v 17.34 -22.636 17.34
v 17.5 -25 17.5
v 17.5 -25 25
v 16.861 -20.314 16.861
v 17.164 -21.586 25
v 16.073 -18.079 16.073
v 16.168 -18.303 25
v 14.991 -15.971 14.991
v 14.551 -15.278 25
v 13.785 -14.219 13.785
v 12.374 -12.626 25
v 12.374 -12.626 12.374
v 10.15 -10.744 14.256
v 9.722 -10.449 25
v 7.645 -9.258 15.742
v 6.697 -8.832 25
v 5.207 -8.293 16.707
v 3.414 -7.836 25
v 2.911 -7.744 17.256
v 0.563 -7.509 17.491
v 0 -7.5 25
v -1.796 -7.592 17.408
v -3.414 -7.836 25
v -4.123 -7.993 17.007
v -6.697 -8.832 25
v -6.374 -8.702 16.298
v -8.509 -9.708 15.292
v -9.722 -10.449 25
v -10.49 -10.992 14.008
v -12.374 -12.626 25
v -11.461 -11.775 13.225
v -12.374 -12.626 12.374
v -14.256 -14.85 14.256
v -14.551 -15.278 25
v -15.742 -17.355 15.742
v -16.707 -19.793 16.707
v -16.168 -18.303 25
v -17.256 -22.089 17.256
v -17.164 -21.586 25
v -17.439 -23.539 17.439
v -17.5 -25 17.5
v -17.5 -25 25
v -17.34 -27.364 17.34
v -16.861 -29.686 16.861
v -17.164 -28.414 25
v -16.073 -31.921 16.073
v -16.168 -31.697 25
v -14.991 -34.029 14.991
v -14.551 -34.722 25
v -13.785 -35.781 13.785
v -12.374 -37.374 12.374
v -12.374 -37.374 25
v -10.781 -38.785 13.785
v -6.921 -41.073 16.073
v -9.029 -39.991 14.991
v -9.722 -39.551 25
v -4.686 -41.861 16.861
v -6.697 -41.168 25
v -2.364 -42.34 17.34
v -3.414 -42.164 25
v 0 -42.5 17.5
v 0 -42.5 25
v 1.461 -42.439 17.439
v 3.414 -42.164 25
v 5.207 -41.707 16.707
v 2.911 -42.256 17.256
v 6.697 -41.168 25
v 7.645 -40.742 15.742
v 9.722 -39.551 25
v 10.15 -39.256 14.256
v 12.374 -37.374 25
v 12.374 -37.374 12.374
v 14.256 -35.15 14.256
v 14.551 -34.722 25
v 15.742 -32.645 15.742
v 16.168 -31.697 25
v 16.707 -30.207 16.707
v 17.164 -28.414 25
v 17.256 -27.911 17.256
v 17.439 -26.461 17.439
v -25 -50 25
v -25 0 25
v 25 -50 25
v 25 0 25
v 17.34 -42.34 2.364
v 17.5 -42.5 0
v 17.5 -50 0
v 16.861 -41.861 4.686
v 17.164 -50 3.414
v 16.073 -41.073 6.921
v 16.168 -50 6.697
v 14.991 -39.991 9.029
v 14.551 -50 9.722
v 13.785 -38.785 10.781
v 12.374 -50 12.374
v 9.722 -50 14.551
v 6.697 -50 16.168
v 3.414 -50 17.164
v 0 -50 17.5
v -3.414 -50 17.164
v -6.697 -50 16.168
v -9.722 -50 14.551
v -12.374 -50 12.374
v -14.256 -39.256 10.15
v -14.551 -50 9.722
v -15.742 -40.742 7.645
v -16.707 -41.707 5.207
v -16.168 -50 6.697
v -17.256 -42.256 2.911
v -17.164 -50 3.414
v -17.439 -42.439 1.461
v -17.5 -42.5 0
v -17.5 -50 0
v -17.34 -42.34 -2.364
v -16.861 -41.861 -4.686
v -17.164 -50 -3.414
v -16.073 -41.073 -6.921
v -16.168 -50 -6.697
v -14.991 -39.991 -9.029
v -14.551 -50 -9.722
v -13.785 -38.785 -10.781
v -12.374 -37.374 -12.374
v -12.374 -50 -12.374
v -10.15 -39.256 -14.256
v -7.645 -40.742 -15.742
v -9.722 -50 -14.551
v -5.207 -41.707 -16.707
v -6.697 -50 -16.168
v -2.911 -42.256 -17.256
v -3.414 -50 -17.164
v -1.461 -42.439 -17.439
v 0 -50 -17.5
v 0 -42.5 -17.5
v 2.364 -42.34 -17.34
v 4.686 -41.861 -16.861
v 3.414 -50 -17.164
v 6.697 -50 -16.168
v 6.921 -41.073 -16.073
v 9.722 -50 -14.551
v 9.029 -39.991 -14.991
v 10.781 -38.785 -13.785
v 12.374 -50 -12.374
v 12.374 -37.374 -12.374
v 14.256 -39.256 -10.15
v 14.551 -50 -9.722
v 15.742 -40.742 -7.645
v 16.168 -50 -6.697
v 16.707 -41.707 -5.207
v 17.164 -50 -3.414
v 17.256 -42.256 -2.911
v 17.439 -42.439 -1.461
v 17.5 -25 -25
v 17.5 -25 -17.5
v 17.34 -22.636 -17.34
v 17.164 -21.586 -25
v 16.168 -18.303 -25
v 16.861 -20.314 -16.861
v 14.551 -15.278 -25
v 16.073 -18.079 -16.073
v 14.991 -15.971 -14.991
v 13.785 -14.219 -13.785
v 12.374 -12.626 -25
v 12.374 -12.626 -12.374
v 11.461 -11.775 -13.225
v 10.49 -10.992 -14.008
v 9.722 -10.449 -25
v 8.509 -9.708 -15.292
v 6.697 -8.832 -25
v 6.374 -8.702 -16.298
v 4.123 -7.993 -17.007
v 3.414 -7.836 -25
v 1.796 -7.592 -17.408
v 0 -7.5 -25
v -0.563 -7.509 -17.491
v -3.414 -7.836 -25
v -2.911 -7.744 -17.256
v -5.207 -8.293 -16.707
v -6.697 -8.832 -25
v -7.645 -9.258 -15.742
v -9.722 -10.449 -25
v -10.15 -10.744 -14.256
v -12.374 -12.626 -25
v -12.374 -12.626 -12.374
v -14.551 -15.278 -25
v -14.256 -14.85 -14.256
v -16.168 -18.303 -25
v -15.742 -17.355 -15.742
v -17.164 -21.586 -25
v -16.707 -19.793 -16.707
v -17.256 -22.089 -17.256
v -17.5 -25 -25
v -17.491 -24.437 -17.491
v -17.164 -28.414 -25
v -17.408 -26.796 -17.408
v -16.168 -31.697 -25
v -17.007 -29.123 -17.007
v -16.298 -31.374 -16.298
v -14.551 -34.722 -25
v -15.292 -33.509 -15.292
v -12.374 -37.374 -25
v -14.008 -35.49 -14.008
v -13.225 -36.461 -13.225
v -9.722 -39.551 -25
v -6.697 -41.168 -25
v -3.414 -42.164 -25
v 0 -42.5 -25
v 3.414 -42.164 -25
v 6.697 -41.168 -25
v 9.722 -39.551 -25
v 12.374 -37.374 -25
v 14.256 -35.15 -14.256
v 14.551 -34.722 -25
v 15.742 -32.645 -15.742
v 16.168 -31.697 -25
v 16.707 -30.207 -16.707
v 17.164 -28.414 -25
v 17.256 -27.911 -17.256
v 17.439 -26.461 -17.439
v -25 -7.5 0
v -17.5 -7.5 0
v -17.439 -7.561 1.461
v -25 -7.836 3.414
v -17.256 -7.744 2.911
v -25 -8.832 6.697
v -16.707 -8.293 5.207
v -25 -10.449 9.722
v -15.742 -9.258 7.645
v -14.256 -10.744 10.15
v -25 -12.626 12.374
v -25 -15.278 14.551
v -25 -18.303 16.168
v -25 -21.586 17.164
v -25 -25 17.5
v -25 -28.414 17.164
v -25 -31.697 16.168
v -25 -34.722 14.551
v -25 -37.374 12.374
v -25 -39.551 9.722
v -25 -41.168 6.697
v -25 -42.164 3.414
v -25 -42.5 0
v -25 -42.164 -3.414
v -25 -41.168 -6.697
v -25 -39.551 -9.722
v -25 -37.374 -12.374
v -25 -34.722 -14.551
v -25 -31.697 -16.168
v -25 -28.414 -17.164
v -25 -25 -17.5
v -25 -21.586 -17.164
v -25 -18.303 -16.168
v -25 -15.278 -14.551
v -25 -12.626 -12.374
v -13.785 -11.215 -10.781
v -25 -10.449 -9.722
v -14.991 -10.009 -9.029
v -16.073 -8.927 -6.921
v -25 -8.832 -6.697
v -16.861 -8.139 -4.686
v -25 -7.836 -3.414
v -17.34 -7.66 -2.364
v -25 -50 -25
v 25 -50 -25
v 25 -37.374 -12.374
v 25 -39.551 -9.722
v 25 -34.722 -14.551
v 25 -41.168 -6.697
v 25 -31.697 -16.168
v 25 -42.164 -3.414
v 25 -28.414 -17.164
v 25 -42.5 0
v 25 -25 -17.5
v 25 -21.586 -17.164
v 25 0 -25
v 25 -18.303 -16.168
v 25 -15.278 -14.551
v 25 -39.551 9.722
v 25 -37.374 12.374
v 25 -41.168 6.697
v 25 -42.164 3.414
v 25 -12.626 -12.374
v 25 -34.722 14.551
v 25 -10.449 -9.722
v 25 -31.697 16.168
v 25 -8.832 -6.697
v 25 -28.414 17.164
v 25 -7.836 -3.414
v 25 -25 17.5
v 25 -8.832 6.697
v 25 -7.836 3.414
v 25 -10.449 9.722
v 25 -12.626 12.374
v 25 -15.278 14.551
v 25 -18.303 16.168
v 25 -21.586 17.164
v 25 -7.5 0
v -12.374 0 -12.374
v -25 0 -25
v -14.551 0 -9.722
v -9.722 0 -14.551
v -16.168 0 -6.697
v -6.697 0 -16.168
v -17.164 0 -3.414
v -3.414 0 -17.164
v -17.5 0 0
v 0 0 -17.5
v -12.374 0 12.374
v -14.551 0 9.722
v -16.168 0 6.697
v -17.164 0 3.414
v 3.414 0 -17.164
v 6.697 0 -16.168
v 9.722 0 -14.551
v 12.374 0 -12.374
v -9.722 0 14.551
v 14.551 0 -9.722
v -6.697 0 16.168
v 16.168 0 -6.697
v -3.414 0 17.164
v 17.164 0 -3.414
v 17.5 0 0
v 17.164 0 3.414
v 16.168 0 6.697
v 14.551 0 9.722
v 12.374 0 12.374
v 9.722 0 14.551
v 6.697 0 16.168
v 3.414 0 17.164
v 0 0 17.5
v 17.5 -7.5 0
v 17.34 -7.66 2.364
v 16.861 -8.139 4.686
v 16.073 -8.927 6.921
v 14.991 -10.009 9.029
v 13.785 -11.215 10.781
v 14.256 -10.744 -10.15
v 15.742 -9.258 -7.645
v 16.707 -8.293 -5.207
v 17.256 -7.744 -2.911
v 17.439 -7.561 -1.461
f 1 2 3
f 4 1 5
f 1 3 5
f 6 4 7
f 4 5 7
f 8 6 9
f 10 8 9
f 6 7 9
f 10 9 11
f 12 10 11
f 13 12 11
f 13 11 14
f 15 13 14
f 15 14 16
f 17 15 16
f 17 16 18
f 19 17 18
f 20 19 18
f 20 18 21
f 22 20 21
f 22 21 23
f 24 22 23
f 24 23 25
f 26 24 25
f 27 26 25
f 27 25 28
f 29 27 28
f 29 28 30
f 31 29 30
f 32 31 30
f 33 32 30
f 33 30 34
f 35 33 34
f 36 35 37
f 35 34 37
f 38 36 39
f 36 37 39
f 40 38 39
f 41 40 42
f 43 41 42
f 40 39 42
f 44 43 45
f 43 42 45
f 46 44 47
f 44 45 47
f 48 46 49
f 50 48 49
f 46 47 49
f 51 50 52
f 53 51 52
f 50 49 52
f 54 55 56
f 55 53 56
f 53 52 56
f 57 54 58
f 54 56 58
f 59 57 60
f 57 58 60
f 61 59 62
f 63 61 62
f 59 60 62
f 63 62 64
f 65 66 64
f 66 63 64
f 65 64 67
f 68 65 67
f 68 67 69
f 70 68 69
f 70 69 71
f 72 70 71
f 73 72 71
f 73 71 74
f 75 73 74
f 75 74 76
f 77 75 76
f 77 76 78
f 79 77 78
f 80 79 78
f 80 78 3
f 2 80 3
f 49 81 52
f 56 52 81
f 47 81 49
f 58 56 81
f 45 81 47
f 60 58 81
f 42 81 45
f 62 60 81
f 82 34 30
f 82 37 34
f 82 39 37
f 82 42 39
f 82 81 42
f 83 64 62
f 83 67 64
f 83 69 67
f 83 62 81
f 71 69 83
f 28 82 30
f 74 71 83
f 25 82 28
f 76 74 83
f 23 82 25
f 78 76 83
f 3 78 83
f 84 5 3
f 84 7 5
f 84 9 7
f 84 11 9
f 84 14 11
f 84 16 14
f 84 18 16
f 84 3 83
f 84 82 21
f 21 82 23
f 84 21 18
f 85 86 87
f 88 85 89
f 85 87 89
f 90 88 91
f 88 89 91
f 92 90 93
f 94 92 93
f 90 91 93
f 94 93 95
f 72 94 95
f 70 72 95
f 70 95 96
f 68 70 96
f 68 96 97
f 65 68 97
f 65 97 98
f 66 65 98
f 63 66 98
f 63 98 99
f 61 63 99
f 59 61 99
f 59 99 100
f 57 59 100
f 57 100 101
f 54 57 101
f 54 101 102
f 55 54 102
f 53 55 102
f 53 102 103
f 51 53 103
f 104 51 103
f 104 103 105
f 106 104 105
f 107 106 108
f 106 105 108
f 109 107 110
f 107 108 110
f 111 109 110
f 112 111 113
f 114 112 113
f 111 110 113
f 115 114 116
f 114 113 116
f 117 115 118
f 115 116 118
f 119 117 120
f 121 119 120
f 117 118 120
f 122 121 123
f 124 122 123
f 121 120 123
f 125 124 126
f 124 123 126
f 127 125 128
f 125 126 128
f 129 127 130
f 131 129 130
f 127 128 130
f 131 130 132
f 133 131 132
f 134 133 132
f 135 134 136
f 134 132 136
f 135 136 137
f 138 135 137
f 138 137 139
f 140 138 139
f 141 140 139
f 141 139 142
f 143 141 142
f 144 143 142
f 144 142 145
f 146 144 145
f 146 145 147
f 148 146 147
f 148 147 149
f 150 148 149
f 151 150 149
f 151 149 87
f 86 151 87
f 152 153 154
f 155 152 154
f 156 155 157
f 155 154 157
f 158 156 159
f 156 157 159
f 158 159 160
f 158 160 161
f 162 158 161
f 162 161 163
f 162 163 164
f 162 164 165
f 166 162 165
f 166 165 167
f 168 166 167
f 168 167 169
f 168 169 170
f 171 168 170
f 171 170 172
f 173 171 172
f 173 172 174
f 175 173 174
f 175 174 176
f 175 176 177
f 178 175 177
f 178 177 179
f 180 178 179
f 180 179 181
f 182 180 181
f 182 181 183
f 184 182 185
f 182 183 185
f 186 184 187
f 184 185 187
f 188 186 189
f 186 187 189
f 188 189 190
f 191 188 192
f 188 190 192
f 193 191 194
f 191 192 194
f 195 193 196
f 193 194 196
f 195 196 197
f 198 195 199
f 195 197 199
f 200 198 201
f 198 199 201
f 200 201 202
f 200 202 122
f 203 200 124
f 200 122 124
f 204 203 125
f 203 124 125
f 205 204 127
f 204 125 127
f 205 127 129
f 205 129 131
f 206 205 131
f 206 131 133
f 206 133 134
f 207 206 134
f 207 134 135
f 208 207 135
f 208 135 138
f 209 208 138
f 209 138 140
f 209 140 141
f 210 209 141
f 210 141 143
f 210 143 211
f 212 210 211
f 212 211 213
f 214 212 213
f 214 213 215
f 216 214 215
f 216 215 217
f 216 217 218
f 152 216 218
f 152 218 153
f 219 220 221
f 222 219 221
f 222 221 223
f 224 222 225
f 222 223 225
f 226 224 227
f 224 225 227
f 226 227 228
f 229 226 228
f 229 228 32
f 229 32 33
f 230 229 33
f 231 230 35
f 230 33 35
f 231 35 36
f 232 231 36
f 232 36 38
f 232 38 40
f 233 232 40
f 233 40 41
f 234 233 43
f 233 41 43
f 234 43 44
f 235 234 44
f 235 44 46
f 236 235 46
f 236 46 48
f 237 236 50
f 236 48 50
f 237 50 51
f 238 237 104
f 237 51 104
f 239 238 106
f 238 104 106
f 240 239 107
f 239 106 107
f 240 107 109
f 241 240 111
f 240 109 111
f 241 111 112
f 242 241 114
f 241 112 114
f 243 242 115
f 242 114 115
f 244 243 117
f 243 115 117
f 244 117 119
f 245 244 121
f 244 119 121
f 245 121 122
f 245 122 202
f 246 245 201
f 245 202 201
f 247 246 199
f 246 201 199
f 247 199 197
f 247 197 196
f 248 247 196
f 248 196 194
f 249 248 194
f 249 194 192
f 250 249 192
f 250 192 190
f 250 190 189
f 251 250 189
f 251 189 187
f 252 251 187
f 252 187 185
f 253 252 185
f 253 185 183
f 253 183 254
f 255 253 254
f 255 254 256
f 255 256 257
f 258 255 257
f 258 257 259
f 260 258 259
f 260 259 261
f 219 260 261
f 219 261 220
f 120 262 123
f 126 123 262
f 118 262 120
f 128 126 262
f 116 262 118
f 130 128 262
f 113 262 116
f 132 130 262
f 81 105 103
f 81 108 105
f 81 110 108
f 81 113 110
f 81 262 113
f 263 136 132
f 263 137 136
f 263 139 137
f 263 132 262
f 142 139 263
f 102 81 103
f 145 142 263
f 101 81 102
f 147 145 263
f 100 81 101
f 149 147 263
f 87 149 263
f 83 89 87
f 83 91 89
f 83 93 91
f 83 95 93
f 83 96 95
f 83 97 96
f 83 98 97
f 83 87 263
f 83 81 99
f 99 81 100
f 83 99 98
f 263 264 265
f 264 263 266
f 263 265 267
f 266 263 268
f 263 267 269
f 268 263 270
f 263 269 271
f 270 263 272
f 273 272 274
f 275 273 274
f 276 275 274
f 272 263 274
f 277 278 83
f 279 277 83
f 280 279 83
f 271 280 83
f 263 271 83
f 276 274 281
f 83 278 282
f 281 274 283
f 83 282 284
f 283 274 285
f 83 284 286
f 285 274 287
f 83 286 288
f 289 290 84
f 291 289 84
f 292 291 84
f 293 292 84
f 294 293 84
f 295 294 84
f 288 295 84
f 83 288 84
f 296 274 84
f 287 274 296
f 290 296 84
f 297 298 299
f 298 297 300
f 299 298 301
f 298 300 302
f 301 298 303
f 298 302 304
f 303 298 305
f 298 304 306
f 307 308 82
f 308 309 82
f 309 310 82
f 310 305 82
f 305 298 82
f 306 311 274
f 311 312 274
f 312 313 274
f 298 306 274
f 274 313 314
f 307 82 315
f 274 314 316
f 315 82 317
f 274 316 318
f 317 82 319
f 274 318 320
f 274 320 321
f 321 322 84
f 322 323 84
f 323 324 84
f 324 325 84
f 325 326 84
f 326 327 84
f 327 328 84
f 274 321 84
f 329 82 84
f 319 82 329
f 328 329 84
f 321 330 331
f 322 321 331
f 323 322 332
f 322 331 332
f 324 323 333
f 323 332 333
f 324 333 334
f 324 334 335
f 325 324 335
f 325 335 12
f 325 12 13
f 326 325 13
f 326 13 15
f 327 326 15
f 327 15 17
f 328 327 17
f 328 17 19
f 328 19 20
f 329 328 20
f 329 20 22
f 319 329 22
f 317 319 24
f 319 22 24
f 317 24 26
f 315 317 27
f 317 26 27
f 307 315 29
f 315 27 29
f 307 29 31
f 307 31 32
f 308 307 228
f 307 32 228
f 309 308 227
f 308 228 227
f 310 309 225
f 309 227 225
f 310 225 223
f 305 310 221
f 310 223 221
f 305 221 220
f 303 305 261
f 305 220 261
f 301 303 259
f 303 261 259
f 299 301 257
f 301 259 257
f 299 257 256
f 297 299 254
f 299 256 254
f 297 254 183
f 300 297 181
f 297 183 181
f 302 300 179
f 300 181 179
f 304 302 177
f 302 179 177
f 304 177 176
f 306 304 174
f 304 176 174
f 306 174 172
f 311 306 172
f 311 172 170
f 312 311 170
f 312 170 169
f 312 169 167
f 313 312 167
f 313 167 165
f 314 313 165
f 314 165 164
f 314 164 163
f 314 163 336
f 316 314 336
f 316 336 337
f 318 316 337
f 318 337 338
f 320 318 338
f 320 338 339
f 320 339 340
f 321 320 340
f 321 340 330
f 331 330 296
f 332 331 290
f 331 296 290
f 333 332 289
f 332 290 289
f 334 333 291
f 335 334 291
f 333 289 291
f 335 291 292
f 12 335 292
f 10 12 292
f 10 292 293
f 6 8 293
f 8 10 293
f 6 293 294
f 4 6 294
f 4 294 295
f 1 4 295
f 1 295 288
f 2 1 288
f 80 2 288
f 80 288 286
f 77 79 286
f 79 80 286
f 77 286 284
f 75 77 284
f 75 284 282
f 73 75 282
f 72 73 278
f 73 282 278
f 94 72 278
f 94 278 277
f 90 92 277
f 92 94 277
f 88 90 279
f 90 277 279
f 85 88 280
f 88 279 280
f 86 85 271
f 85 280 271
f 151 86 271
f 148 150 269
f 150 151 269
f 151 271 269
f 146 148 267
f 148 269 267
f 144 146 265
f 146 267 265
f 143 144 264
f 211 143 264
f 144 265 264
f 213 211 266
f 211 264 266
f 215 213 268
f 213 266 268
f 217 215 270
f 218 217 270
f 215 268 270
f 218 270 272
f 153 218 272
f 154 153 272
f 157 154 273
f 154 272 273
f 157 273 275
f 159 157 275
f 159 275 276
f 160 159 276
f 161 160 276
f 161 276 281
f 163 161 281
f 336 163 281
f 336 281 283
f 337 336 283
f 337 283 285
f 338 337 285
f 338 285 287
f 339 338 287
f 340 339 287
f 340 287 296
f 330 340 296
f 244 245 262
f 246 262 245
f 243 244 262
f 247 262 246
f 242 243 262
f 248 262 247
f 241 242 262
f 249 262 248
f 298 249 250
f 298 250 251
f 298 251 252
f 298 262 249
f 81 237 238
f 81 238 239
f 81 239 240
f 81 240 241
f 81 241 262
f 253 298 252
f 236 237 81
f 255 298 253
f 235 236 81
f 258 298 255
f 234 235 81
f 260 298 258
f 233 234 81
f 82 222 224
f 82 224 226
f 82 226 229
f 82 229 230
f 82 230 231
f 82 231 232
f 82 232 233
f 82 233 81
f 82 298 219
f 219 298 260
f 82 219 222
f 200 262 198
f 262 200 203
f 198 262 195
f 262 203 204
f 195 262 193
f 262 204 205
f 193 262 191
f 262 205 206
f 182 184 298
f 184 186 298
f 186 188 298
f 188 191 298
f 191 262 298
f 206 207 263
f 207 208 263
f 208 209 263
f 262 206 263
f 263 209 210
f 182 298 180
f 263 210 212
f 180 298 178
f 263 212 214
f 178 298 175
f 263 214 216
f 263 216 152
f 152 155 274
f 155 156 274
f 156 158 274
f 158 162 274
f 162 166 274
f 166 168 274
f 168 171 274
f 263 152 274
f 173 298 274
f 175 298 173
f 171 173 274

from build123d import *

# Parameters (mm, degrees)
F0_W     = 50
F0_H     = 50
F1_DEPTH = 50
F2_R     = 17.5
F3_DEPTH = 50.001
F4_R     = 17.5
F5_DEPTH = 50.001
F6_R     = 17.5
F7_DEPTH = 50.001


with BuildPart() as f1:
    # F0 (on Front) → F1 (new body)
    with BuildSketch(Plane.XZ):
        Rectangle(F0_W, F0_H)
    extrude(amount=F1_DEPTH)

    # F2 (on face) → F3 (cut, through all)
    with BuildSketch(Plane.XZ.offset(50)):
        Circle(F2_R)
    extrude(amount=-F3_DEPTH, mode=Mode.SUBTRACT)

    # F4 (on face) → F5 (cut, through all)
    with BuildSketch(Plane.XY.offset(25)):
        with Locations((0, -25)):
            Circle(F4_R)
    extrude(amount=-F5_DEPTH, mode=Mode.SUBTRACT)

    # F6 (on face) → F7 (cut, through all)
    with BuildSketch(Plane.YZ.offset(25)):
        with Locations((-25, 0)):
            Circle(F6_R)
    extrude(amount=-F7_DEPTH, mode=Mode.SUBTRACT)


solid = f1.part
